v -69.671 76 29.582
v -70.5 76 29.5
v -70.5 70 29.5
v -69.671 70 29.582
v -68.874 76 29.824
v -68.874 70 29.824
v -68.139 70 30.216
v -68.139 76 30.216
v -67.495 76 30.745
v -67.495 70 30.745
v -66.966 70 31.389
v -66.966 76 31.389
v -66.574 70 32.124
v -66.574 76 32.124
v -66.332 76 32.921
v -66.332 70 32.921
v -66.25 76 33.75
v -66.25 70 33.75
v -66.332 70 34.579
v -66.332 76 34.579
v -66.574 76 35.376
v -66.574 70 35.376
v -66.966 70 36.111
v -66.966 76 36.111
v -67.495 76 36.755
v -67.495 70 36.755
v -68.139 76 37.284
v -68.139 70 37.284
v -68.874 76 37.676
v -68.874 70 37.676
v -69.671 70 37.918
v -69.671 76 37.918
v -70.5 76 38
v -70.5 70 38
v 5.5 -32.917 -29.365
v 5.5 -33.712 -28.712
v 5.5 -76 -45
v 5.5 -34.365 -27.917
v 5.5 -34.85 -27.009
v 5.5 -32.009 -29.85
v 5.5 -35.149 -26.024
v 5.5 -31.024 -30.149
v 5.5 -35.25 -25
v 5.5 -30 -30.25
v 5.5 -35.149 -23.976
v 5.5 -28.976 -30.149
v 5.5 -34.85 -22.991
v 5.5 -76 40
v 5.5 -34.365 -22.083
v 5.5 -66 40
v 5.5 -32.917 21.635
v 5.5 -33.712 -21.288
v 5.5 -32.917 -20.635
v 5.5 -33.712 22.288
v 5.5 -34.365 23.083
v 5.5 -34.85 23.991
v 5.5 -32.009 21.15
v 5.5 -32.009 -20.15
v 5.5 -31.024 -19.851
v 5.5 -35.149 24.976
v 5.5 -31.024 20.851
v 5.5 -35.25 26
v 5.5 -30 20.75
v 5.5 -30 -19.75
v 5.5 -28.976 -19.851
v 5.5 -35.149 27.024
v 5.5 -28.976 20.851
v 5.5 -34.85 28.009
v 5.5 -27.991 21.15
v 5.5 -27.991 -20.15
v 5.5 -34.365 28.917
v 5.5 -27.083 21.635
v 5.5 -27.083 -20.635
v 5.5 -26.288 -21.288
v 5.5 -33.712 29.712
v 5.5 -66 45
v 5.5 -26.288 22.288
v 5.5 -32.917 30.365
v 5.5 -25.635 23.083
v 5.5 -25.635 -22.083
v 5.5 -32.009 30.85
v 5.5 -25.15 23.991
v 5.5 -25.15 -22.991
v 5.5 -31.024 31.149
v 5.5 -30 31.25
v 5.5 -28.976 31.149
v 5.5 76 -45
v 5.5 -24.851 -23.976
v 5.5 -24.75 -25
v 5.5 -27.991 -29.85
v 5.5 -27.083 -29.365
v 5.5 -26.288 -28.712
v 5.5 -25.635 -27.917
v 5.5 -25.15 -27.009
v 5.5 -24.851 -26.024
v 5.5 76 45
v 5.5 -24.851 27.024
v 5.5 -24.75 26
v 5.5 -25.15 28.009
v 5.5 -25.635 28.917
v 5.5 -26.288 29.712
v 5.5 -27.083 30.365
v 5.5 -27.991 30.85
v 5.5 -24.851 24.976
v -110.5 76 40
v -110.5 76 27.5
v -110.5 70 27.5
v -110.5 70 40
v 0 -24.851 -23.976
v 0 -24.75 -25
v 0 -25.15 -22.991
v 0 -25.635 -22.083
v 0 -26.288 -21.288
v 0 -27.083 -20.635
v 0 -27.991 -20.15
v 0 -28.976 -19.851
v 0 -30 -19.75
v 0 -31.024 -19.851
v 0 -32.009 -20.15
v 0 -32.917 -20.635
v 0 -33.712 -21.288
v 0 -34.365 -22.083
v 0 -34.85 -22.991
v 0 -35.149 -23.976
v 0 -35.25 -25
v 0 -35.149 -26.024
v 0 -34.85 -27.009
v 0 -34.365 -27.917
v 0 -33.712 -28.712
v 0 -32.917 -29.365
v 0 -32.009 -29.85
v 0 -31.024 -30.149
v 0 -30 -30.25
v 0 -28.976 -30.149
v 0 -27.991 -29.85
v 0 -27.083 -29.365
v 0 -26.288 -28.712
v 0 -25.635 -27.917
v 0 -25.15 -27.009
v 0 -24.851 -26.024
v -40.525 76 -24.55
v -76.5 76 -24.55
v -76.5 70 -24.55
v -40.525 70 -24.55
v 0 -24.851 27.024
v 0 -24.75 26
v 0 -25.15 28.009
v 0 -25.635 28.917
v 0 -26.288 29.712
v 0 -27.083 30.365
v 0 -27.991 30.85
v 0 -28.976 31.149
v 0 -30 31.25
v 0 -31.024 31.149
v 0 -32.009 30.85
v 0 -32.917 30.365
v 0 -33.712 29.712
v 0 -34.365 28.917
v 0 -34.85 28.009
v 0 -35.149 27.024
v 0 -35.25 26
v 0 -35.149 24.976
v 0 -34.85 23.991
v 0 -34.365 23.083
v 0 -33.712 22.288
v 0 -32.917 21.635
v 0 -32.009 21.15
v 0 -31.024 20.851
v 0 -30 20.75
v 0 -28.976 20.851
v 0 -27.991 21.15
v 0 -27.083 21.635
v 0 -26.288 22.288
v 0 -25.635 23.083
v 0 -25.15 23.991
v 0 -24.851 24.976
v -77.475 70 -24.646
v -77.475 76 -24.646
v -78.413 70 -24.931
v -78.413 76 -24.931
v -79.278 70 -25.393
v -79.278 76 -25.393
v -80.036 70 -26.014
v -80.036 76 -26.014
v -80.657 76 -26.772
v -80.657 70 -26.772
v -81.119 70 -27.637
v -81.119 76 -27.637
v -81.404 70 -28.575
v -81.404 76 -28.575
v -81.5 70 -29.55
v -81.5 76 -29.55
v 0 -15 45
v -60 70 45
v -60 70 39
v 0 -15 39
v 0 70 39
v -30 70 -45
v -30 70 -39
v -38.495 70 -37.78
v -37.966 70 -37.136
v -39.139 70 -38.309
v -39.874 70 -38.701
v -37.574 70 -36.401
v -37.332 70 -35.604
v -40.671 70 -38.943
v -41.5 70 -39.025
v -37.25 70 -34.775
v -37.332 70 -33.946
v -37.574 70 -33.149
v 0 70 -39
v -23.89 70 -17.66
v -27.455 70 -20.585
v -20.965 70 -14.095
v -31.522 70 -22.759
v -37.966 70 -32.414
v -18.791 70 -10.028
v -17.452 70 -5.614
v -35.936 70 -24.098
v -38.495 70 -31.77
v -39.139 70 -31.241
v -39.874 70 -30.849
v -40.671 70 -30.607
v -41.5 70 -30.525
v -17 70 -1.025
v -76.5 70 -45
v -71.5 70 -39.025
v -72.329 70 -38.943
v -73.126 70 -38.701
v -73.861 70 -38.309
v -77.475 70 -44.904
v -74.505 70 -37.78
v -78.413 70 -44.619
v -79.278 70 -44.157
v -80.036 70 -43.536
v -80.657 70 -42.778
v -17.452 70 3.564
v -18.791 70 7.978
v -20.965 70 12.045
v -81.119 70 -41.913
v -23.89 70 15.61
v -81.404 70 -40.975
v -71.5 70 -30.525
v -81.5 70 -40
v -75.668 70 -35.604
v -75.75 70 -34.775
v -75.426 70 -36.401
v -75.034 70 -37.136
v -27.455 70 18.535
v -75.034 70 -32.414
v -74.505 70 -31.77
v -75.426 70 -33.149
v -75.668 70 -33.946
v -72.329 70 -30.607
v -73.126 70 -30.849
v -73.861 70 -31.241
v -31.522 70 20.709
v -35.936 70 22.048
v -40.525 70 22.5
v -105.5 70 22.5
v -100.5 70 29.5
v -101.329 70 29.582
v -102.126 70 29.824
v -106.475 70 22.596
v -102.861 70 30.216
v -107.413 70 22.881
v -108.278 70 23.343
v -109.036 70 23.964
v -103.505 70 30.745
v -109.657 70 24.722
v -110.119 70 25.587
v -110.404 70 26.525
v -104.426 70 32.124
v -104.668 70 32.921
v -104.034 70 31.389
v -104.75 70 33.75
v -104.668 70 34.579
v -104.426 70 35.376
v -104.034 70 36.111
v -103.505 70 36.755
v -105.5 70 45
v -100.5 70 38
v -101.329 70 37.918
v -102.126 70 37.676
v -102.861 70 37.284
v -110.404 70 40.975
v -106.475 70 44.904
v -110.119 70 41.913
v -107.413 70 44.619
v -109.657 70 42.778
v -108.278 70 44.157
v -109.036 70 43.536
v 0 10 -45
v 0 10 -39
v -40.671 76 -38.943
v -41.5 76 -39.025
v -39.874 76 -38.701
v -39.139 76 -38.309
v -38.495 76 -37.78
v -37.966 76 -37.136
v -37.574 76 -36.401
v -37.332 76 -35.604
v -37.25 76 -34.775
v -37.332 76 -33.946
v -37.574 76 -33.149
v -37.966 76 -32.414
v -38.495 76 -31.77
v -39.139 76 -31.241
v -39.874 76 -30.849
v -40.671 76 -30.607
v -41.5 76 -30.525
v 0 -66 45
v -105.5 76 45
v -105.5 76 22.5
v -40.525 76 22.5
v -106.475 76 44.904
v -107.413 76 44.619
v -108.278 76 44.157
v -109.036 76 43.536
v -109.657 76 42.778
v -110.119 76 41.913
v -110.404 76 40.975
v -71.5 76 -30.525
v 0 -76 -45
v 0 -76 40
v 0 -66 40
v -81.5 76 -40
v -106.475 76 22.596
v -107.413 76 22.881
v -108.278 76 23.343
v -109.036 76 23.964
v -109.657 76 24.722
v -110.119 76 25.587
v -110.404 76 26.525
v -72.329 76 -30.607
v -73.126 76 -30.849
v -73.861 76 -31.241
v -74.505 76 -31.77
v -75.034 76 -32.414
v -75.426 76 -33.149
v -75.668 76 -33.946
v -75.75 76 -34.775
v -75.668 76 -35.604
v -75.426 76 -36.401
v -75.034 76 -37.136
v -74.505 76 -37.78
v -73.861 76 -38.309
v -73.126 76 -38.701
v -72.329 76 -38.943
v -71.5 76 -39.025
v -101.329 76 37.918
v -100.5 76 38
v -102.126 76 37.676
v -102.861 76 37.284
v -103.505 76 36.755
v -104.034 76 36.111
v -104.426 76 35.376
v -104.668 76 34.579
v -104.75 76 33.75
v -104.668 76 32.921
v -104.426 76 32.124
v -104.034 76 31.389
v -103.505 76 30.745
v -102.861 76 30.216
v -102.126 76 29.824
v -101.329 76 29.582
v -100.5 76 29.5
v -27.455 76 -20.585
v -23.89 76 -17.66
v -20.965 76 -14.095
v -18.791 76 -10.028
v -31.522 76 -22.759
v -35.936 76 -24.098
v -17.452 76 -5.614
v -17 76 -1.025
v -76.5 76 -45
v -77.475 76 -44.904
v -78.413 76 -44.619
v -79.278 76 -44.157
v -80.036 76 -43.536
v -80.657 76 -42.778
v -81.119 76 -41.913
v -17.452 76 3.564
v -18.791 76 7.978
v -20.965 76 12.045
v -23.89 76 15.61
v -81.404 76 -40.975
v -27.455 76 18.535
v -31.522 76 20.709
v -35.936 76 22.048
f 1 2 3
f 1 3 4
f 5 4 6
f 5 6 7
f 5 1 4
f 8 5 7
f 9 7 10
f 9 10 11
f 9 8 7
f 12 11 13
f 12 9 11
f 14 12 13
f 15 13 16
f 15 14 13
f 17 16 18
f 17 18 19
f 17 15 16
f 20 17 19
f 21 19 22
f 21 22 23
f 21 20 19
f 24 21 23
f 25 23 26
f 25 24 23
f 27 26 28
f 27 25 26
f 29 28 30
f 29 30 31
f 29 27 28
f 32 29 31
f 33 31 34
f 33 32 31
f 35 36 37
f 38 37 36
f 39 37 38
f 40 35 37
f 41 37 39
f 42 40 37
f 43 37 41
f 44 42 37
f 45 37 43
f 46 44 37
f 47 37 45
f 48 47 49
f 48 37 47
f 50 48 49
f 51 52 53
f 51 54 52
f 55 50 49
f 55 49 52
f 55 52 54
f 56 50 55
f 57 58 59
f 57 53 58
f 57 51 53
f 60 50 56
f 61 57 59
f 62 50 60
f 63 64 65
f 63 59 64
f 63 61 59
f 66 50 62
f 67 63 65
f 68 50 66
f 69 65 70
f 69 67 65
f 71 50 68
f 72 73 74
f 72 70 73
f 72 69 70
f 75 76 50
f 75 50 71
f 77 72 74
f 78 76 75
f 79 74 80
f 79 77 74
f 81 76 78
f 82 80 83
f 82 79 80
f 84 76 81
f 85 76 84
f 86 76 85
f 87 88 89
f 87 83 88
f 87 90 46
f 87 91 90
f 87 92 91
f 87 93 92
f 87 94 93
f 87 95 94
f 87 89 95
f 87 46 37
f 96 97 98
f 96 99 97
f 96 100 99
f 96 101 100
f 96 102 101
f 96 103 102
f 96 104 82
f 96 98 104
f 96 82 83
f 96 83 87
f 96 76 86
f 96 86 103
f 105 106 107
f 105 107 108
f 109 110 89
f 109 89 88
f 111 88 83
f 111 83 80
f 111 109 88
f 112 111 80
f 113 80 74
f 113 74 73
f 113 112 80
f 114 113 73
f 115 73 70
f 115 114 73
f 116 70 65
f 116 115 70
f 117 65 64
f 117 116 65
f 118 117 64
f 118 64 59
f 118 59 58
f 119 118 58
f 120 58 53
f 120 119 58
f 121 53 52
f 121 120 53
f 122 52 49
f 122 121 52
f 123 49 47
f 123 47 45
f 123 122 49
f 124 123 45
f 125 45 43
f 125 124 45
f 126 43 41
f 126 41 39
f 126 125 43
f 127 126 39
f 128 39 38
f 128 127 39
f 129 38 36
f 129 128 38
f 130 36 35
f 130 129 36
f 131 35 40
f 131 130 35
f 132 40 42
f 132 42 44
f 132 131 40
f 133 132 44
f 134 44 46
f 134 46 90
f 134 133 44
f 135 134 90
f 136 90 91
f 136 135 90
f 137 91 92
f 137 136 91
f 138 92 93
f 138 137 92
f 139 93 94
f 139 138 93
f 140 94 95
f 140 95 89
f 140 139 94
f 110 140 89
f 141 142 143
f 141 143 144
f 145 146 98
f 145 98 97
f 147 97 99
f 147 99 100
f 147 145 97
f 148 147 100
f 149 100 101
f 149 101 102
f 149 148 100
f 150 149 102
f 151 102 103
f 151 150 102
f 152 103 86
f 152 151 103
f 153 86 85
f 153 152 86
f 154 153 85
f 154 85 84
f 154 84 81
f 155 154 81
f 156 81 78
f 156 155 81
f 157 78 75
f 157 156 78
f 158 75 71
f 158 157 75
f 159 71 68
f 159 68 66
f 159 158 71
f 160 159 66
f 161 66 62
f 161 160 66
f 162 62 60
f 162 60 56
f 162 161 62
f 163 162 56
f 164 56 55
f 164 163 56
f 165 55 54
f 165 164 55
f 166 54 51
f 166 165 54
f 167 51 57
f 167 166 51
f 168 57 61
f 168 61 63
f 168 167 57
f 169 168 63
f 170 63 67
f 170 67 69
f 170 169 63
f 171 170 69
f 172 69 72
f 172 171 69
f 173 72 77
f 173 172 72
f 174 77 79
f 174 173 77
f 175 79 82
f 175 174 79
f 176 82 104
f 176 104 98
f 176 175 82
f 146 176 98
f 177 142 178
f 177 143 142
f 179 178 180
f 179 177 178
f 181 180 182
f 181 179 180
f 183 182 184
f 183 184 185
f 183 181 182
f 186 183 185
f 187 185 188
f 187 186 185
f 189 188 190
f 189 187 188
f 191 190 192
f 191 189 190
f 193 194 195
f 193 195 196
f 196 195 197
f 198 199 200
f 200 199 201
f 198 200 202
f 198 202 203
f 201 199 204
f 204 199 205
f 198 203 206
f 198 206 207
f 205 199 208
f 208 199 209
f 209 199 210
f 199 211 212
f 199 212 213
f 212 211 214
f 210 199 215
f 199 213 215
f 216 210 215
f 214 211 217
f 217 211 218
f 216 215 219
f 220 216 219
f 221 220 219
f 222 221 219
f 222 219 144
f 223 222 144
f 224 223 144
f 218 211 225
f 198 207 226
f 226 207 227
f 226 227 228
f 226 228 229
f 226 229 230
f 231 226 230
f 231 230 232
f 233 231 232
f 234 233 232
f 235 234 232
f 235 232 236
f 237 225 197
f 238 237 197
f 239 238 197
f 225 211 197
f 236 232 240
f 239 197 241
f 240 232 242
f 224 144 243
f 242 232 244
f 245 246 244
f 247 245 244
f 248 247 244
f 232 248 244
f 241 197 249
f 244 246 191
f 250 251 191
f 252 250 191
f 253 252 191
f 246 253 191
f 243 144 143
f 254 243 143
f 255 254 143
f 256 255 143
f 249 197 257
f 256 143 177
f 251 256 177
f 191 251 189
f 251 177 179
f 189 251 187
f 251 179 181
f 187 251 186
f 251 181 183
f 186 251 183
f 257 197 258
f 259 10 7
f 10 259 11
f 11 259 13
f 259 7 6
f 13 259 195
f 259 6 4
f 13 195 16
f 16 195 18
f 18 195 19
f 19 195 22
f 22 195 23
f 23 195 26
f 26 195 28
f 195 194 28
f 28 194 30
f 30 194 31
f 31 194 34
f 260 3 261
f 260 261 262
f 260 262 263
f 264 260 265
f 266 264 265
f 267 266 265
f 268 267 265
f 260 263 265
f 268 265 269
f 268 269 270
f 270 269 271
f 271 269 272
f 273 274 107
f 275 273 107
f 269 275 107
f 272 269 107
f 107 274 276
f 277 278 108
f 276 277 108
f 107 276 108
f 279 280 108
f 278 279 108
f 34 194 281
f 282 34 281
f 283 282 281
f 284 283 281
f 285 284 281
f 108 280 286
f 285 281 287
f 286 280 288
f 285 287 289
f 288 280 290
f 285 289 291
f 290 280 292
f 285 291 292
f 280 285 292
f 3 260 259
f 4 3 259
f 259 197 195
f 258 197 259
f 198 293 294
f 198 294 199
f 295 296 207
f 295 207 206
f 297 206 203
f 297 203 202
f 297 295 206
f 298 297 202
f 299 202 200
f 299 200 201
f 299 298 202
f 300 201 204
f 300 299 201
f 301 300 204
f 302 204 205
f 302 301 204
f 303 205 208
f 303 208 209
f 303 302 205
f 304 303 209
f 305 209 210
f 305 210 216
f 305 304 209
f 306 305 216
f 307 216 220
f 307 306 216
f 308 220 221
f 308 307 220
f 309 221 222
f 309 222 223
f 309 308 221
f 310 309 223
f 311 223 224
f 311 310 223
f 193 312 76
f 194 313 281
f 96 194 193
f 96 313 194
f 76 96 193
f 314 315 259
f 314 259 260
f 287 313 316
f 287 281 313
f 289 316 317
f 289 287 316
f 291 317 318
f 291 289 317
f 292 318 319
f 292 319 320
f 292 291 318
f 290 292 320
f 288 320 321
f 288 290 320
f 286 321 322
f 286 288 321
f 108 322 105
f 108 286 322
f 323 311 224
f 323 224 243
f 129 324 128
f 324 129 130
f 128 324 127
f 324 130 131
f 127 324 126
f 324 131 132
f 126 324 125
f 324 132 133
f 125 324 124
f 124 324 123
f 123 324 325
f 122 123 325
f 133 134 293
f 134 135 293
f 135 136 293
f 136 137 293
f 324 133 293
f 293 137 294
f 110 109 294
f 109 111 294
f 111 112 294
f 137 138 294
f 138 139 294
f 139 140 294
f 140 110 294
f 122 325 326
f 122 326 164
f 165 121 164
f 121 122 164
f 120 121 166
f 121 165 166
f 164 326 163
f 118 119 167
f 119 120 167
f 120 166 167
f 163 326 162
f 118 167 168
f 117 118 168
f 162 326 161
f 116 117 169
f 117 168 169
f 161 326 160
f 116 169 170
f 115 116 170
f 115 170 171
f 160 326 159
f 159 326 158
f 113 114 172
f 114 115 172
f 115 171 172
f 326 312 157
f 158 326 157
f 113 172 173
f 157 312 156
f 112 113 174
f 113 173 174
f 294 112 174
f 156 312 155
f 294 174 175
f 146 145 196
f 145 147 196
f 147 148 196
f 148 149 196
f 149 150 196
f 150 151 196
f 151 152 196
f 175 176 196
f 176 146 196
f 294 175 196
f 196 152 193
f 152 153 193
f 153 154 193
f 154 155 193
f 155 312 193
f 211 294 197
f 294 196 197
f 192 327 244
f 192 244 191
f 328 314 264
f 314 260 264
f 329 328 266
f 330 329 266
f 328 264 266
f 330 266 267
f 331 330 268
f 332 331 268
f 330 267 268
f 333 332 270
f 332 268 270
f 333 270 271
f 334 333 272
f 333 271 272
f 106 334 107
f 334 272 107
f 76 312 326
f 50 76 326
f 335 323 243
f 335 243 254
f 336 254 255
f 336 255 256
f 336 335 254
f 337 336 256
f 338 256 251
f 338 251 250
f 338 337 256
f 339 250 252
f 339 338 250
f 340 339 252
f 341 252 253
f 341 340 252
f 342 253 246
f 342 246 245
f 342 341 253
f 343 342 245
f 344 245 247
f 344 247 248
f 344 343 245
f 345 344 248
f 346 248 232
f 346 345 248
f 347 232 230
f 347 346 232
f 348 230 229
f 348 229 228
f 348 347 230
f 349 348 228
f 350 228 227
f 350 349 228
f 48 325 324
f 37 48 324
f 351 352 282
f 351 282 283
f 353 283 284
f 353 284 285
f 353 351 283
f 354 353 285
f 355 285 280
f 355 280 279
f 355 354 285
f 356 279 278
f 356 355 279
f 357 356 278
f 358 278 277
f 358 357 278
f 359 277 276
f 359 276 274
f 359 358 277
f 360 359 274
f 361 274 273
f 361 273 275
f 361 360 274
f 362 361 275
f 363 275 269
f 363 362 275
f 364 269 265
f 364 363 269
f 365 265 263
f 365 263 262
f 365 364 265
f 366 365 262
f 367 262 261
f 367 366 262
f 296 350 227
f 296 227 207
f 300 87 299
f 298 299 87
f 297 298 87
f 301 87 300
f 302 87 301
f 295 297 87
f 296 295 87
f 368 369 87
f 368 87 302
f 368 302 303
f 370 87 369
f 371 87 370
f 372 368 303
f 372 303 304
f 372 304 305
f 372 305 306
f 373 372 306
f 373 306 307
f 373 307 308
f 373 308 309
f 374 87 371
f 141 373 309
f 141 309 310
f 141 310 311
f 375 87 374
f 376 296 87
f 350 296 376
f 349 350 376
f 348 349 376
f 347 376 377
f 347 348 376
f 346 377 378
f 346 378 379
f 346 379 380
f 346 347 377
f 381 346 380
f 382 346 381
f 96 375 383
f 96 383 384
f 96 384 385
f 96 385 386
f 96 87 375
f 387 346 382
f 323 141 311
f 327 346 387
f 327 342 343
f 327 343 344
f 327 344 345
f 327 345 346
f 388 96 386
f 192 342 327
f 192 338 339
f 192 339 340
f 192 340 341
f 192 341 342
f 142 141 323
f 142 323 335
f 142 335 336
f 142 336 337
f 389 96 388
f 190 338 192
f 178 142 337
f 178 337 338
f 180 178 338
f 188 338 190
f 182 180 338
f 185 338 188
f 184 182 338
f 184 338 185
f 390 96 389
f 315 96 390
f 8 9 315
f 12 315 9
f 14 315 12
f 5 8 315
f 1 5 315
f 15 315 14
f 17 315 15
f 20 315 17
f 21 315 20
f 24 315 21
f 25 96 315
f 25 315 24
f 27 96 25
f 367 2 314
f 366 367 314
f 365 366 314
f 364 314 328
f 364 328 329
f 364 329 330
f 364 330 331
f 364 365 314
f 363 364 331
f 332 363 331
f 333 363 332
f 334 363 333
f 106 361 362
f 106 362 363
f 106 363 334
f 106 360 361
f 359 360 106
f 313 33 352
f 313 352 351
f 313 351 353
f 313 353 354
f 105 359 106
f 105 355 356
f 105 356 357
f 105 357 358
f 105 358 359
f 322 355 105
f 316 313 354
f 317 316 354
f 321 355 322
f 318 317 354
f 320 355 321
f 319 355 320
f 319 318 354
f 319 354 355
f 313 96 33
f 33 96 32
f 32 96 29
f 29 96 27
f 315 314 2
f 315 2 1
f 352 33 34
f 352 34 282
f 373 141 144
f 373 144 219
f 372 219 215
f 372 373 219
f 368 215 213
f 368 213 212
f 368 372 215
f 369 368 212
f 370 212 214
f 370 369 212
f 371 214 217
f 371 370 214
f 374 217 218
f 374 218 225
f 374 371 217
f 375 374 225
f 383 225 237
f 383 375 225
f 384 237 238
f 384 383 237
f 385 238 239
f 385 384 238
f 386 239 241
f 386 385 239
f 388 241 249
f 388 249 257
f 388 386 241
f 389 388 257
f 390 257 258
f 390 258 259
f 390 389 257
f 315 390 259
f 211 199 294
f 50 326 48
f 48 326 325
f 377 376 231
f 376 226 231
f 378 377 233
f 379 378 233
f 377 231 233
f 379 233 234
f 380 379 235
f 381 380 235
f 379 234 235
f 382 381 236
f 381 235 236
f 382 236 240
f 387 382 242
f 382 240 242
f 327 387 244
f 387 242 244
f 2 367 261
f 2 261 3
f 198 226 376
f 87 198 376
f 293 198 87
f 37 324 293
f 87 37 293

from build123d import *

# Parameters (mm, degrees)
F0_R     = 5.25
F1_DEPTH = 5.5
F3_DEPTH = 6
F5_DEPTH = 6
F7_DEPTH = 6
F8_R     = 5


with BuildPart() as f1:
    # F0 (on Right) → F1 (new body)
    with BuildSketch(Plane.YZ):
        Polygon((76, -45), (76, 45), (-66, 45), (-66, 40), (-76, 40), (-76, -45), align=None)
        with Locations((-30, -25)):
            Circle(F0_R, mode=Mode.SUBTRACT)
        with Locations((-30, 26)):
            Circle(F0_R, mode=Mode.SUBTRACT)
    extrude(amount=F1_DEPTH)

    # F2 (on face) → F3 (join)
    with BuildSketch(Plane(origin=(0, 76, 0), x_dir=(-1, 0, 0), z_dir=(0, 1, 0))):
        with BuildLine():
            Line((110.5, 45), (0, 45))
            Line((0, 45), (0, -45))
            Line((0, -45), (81.5, -45))
            Line((81.5, -45), (81.5, -24.55))
            Line((81.5, -24.55), (40.525, -24.55))
            ThreePointArc((40.525, -24.55), (17, -1.025), (40.525, 22.5))
            Line((40.525, 22.5), (110.5, 22.5))
            Line((110.5, 22.5), (110.5, 45))
        make_face()
        with BuildLine():
            ThreePointArc((71.5, -30.525), (75.75, -34.775), (71.5, -39.025))
            Line((71.5, -39.025), (41.5, -39.025))
            ThreePointArc((41.5, -39.025), (37.25, -34.775), (41.5, -30.525))
            Line((41.5, -30.525), (71.5, -30.525))
        make_face(mode=Mode.SUBTRACT)
        with BuildLine():
            ThreePointArc((100.5, 38), (104.75, 33.75), (100.5, 29.5))
            Line((100.5, 29.5), (70.5, 29.5))
            ThreePointArc((70.5, 29.5), (66.25, 33.75), (70.5, 38))
            Line((70.5, 38), (100.5, 38))
        make_face(mode=Mode.SUBTRACT)
    extrude(amount=-F3_DEPTH)

    # F4 (on face) → F5 (join)
    with BuildSketch(Plane.XY.offset(45)):
        Polygon((0, -15), (0, 70), (-60, 70), align=None)
    extrude(amount=-F5_DEPTH)

    # F6 (on face) → F7 (join)
    with BuildSketch(Plane(origin=(0, 0, -45), x_dir=(1, 0, 0), z_dir=(0, 0, -1))):
        Polygon((-30, -70), (0, -70), (0, -10), align=None)
    extrude(amount=-F7_DEPTH)

    # F8
    f8_edges = [f1.edges().sort_by_distance(p)[0] for p in [
        (-110.5, 73, 45),
        (-110.5, 73, 22.5),
        (-81.5, 73, -24.55),
        (-81.5, 73, -45),
    ]]
    fillet(f8_edges, radius=F8_R)


solid = f1.part
